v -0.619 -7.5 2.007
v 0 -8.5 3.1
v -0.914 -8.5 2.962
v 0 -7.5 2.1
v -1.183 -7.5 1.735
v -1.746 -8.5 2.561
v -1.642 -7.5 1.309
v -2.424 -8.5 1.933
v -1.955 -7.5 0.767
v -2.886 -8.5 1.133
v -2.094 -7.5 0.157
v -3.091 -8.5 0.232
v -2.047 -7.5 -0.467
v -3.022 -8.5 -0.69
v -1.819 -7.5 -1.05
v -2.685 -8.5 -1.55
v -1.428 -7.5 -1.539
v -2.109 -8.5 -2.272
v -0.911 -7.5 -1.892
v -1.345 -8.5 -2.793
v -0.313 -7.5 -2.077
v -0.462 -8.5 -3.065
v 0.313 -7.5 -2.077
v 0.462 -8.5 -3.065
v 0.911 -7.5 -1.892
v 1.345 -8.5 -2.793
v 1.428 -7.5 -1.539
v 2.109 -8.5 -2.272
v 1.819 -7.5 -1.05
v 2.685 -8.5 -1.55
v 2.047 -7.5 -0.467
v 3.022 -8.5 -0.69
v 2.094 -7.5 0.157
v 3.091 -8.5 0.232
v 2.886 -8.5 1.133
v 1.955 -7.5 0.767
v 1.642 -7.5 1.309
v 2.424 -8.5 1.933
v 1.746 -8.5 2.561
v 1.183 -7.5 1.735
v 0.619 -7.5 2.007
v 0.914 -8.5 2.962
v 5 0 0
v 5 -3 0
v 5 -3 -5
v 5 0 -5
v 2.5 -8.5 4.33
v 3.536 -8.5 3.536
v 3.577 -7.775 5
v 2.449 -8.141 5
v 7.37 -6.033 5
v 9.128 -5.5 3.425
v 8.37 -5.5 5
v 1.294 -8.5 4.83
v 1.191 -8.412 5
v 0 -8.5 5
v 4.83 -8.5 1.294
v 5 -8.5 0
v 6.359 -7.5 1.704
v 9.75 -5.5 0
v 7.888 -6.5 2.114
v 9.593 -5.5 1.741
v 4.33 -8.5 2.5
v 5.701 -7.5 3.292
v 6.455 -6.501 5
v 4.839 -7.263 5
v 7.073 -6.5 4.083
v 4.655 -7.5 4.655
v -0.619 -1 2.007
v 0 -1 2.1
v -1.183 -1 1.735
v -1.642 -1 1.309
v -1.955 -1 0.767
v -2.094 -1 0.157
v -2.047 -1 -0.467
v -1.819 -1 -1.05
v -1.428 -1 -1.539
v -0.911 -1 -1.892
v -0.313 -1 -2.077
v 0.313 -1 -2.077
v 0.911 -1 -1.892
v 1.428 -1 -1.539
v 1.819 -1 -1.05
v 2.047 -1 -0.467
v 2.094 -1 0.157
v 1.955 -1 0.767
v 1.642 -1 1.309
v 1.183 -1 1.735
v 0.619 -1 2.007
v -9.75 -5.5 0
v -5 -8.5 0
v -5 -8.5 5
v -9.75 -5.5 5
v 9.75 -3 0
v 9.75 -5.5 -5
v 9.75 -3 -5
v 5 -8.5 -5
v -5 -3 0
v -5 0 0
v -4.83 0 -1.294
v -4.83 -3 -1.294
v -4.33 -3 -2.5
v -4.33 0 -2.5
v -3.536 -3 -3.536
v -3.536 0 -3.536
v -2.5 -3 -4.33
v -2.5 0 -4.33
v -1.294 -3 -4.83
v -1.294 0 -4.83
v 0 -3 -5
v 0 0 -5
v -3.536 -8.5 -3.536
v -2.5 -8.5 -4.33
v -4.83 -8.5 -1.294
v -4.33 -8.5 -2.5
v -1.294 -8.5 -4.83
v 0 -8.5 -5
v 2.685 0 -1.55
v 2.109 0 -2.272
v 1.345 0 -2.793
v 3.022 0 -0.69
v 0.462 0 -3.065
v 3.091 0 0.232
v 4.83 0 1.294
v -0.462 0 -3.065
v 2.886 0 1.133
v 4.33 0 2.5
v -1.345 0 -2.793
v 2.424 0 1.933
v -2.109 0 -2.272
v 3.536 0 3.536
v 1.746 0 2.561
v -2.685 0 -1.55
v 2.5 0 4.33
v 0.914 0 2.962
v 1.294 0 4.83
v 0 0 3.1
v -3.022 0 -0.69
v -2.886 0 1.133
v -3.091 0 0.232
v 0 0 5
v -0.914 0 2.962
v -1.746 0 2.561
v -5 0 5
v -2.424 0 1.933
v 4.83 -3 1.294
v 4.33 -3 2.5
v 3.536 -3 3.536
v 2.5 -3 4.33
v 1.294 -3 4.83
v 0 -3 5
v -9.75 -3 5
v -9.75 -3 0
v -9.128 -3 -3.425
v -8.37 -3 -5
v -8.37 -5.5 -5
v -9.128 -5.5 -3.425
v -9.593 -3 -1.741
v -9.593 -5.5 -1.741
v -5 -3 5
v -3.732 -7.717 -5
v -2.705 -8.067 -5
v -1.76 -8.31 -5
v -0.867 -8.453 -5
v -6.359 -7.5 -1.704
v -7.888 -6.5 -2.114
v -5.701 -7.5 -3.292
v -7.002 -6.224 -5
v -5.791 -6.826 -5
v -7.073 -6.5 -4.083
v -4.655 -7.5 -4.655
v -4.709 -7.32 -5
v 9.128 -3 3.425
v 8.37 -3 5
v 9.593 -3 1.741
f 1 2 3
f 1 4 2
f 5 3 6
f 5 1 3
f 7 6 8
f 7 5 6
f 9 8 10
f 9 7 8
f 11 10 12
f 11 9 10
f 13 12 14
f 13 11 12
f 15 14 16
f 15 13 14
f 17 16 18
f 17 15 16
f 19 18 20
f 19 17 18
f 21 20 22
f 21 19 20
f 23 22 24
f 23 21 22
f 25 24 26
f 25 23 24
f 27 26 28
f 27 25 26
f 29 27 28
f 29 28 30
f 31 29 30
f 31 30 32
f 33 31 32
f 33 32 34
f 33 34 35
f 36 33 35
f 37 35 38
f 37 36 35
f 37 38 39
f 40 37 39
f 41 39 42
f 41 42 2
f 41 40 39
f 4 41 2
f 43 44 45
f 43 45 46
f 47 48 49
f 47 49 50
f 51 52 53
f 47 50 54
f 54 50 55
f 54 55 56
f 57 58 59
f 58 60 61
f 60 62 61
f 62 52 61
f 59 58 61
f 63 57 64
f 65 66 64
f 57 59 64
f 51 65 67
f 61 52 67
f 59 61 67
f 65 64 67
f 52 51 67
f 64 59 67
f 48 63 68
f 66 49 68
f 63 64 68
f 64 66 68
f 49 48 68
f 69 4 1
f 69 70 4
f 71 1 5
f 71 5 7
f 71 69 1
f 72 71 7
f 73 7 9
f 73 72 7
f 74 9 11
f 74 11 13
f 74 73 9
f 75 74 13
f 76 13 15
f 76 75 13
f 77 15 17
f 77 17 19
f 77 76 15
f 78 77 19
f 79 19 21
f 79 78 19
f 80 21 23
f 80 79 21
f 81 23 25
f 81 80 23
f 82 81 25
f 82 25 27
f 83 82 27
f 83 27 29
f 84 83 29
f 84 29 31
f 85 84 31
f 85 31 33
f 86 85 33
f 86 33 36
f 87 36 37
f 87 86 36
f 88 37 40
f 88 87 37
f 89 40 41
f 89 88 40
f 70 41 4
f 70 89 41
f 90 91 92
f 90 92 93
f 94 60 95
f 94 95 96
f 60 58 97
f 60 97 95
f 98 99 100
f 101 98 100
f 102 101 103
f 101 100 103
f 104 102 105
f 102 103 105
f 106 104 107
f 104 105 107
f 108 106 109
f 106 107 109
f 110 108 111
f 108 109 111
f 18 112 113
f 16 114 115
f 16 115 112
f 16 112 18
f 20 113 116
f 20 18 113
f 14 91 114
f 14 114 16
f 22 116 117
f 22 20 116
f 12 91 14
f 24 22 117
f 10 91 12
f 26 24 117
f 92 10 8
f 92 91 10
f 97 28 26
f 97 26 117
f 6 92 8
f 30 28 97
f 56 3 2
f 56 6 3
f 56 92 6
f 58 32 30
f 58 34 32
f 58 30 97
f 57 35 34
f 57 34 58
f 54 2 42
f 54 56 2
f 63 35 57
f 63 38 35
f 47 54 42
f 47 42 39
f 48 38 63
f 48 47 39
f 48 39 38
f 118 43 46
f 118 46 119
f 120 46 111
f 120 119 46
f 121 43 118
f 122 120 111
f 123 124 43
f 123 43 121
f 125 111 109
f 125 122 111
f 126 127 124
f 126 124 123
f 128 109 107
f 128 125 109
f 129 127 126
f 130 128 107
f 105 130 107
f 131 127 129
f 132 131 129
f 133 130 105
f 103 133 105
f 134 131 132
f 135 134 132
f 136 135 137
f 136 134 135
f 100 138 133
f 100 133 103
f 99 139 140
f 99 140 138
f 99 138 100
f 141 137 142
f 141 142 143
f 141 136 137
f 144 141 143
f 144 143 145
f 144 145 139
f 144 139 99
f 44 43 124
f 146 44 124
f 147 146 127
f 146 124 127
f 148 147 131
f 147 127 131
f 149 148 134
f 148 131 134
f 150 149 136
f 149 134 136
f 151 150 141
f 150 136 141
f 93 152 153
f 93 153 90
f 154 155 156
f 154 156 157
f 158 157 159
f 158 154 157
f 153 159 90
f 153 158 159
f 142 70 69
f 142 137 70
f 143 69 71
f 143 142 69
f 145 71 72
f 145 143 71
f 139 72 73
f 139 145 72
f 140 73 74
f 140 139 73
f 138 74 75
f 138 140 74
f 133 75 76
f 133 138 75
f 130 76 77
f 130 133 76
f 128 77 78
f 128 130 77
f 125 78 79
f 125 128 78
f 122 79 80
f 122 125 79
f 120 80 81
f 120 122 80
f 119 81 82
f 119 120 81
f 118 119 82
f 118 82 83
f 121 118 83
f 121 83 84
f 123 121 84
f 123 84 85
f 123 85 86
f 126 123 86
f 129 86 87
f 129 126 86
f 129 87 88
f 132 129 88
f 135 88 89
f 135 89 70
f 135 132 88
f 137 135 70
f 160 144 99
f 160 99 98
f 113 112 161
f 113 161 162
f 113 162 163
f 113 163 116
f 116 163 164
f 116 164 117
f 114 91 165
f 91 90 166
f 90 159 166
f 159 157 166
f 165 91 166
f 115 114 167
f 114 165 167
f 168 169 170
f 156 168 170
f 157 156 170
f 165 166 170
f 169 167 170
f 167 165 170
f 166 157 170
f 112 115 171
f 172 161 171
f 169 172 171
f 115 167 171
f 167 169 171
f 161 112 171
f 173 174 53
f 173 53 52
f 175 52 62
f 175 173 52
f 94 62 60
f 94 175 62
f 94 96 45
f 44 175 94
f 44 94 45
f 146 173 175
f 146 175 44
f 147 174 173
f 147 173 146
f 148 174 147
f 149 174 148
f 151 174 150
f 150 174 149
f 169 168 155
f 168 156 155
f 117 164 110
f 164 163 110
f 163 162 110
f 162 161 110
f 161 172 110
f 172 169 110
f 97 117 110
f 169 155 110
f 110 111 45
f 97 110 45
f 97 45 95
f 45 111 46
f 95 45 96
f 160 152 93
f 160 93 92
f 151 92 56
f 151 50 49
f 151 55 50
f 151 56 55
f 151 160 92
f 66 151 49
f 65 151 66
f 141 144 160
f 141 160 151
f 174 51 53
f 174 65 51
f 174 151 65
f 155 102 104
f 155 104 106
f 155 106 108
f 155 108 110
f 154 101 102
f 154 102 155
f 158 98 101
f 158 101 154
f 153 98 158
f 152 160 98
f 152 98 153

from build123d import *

# Parameters (mm, degrees)
EXTRUDE_1_DEPTH     = 5
CUT_EXTRUDE_1_DEPTH = 3
CUT_EXTRUDE_2_DEPTH = 6.5


with BuildPart() as part:
    # Эскиз1 → Бобышка-Вытянуть1 (new body, symmetric)
    with BuildSketch(Plane.XY):
        Polygon((5, 0), (-5, 0), (-5, -3), (-9.75, -3), (-9.75, -8.5), (9.75, -8.5), (9.75, -3), (5, -3), align=None)
    extrude(amount=EXTRUDE_1_DEPTH, both=True)

    # Эскиз3 → Отверстие обработанное метчиком M51 (revolve, cut)
    with BuildSketch(Plane(origin=(0, 0, 0), x_dir=(0, 0, 1), z_dir=(1, 0, 0))):
        Polygon((0, 0), (0, 8.5), (3.1, 8.5), (2.1, 7.5), (2.1, 1), (3.1, 0), align=None)
    revolve(axis=Axis((0, 6.35, 0), (0, -1, 0)), mode=Mode.SUBTRACT)

    # Эскиз4 → Вырез-Вытянуть1 (cut)
    with BuildSketch(Plane(origin=(0, 0, 0), x_dir=(1, 0, 0), z_dir=(0, 1, 0))):
        with BuildLine():
            Line((-5, 5), (-5, 0))
            ThreePointArc((-5, 0), (-3.535533906, 3.535533906), (0, 5))
            Line((0, 5), (-5, 5))
        make_face()
        with BuildLine():
            Line((0, -5), (5, -5))
            Line((5, -5), (5, 0))
            ThreePointArc((5, 0), (3.535533906, -3.535533906), (0, -5))
        make_face()
    extrude(amount=-CUT_EXTRUDE_1_DEPTH, mode=Mode.SUBTRACT)

    # Эскиз5 → Вырез-Вытянуть2 (cut, through all)
    with BuildSketch(Plane(origin=(0, -3, 0), x_dir=(1, 0, 0), z_dir=(0, 1, 0))):
        with BuildLine():
            Line((-9.75, 0), (-9.75, 5))
            Line((-9.75, 5), (-8.370334521, 5))
            ThreePointArc((-8.370334521, 5), (-9.398756875, 2.59342808), (-9.75, 0))
        make_face()
        with BuildLine():
            Line((9.75, 0), (9.75, -5))
            Line((9.75, -5), (8.370334521, -5))
            ThreePointArc((8.370334521, -5), (9.398756875, -2.59342808), (9.75, 0))
        make_face()
    extrude(amount=-CUT_EXTRUDE_2_DEPTH, mode=Mode.SUBTRACT)

    # Вырез-По траектории1: sweep along a path in Эскиз7
    with BuildLine(Plane.XZ.offset(8.5)) as sweep_1_path:
        Line((0, 9.75), (-9.75, 9.75))
        Line((-9.75, 9.75), (-9.75, 0))
        ThreePointArc((-9.75, 0), (-6.894291117, -6.894291117), (0, -9.75))
        Line((0, -9.75), (9.75, -9.75))
        Line((9.75, -9.75), (9.75, 0))
        ThreePointArc((9.75, 0), (6.894291117, 6.894291117), (0, 9.75))
    # Эскиз6 → Вырез-По траектории1 (sweep, cut)
    with BuildSketch(Plane.XY.offset(5)):
        Polygon((-9.75, -5.5), (-9.75, -8.5), (-5, -8.5), align=None)
    sweep(path=sweep_1_path.line, transition=Transition.RIGHT, mode=Mode.SUBTRACT)


solid = part.part
